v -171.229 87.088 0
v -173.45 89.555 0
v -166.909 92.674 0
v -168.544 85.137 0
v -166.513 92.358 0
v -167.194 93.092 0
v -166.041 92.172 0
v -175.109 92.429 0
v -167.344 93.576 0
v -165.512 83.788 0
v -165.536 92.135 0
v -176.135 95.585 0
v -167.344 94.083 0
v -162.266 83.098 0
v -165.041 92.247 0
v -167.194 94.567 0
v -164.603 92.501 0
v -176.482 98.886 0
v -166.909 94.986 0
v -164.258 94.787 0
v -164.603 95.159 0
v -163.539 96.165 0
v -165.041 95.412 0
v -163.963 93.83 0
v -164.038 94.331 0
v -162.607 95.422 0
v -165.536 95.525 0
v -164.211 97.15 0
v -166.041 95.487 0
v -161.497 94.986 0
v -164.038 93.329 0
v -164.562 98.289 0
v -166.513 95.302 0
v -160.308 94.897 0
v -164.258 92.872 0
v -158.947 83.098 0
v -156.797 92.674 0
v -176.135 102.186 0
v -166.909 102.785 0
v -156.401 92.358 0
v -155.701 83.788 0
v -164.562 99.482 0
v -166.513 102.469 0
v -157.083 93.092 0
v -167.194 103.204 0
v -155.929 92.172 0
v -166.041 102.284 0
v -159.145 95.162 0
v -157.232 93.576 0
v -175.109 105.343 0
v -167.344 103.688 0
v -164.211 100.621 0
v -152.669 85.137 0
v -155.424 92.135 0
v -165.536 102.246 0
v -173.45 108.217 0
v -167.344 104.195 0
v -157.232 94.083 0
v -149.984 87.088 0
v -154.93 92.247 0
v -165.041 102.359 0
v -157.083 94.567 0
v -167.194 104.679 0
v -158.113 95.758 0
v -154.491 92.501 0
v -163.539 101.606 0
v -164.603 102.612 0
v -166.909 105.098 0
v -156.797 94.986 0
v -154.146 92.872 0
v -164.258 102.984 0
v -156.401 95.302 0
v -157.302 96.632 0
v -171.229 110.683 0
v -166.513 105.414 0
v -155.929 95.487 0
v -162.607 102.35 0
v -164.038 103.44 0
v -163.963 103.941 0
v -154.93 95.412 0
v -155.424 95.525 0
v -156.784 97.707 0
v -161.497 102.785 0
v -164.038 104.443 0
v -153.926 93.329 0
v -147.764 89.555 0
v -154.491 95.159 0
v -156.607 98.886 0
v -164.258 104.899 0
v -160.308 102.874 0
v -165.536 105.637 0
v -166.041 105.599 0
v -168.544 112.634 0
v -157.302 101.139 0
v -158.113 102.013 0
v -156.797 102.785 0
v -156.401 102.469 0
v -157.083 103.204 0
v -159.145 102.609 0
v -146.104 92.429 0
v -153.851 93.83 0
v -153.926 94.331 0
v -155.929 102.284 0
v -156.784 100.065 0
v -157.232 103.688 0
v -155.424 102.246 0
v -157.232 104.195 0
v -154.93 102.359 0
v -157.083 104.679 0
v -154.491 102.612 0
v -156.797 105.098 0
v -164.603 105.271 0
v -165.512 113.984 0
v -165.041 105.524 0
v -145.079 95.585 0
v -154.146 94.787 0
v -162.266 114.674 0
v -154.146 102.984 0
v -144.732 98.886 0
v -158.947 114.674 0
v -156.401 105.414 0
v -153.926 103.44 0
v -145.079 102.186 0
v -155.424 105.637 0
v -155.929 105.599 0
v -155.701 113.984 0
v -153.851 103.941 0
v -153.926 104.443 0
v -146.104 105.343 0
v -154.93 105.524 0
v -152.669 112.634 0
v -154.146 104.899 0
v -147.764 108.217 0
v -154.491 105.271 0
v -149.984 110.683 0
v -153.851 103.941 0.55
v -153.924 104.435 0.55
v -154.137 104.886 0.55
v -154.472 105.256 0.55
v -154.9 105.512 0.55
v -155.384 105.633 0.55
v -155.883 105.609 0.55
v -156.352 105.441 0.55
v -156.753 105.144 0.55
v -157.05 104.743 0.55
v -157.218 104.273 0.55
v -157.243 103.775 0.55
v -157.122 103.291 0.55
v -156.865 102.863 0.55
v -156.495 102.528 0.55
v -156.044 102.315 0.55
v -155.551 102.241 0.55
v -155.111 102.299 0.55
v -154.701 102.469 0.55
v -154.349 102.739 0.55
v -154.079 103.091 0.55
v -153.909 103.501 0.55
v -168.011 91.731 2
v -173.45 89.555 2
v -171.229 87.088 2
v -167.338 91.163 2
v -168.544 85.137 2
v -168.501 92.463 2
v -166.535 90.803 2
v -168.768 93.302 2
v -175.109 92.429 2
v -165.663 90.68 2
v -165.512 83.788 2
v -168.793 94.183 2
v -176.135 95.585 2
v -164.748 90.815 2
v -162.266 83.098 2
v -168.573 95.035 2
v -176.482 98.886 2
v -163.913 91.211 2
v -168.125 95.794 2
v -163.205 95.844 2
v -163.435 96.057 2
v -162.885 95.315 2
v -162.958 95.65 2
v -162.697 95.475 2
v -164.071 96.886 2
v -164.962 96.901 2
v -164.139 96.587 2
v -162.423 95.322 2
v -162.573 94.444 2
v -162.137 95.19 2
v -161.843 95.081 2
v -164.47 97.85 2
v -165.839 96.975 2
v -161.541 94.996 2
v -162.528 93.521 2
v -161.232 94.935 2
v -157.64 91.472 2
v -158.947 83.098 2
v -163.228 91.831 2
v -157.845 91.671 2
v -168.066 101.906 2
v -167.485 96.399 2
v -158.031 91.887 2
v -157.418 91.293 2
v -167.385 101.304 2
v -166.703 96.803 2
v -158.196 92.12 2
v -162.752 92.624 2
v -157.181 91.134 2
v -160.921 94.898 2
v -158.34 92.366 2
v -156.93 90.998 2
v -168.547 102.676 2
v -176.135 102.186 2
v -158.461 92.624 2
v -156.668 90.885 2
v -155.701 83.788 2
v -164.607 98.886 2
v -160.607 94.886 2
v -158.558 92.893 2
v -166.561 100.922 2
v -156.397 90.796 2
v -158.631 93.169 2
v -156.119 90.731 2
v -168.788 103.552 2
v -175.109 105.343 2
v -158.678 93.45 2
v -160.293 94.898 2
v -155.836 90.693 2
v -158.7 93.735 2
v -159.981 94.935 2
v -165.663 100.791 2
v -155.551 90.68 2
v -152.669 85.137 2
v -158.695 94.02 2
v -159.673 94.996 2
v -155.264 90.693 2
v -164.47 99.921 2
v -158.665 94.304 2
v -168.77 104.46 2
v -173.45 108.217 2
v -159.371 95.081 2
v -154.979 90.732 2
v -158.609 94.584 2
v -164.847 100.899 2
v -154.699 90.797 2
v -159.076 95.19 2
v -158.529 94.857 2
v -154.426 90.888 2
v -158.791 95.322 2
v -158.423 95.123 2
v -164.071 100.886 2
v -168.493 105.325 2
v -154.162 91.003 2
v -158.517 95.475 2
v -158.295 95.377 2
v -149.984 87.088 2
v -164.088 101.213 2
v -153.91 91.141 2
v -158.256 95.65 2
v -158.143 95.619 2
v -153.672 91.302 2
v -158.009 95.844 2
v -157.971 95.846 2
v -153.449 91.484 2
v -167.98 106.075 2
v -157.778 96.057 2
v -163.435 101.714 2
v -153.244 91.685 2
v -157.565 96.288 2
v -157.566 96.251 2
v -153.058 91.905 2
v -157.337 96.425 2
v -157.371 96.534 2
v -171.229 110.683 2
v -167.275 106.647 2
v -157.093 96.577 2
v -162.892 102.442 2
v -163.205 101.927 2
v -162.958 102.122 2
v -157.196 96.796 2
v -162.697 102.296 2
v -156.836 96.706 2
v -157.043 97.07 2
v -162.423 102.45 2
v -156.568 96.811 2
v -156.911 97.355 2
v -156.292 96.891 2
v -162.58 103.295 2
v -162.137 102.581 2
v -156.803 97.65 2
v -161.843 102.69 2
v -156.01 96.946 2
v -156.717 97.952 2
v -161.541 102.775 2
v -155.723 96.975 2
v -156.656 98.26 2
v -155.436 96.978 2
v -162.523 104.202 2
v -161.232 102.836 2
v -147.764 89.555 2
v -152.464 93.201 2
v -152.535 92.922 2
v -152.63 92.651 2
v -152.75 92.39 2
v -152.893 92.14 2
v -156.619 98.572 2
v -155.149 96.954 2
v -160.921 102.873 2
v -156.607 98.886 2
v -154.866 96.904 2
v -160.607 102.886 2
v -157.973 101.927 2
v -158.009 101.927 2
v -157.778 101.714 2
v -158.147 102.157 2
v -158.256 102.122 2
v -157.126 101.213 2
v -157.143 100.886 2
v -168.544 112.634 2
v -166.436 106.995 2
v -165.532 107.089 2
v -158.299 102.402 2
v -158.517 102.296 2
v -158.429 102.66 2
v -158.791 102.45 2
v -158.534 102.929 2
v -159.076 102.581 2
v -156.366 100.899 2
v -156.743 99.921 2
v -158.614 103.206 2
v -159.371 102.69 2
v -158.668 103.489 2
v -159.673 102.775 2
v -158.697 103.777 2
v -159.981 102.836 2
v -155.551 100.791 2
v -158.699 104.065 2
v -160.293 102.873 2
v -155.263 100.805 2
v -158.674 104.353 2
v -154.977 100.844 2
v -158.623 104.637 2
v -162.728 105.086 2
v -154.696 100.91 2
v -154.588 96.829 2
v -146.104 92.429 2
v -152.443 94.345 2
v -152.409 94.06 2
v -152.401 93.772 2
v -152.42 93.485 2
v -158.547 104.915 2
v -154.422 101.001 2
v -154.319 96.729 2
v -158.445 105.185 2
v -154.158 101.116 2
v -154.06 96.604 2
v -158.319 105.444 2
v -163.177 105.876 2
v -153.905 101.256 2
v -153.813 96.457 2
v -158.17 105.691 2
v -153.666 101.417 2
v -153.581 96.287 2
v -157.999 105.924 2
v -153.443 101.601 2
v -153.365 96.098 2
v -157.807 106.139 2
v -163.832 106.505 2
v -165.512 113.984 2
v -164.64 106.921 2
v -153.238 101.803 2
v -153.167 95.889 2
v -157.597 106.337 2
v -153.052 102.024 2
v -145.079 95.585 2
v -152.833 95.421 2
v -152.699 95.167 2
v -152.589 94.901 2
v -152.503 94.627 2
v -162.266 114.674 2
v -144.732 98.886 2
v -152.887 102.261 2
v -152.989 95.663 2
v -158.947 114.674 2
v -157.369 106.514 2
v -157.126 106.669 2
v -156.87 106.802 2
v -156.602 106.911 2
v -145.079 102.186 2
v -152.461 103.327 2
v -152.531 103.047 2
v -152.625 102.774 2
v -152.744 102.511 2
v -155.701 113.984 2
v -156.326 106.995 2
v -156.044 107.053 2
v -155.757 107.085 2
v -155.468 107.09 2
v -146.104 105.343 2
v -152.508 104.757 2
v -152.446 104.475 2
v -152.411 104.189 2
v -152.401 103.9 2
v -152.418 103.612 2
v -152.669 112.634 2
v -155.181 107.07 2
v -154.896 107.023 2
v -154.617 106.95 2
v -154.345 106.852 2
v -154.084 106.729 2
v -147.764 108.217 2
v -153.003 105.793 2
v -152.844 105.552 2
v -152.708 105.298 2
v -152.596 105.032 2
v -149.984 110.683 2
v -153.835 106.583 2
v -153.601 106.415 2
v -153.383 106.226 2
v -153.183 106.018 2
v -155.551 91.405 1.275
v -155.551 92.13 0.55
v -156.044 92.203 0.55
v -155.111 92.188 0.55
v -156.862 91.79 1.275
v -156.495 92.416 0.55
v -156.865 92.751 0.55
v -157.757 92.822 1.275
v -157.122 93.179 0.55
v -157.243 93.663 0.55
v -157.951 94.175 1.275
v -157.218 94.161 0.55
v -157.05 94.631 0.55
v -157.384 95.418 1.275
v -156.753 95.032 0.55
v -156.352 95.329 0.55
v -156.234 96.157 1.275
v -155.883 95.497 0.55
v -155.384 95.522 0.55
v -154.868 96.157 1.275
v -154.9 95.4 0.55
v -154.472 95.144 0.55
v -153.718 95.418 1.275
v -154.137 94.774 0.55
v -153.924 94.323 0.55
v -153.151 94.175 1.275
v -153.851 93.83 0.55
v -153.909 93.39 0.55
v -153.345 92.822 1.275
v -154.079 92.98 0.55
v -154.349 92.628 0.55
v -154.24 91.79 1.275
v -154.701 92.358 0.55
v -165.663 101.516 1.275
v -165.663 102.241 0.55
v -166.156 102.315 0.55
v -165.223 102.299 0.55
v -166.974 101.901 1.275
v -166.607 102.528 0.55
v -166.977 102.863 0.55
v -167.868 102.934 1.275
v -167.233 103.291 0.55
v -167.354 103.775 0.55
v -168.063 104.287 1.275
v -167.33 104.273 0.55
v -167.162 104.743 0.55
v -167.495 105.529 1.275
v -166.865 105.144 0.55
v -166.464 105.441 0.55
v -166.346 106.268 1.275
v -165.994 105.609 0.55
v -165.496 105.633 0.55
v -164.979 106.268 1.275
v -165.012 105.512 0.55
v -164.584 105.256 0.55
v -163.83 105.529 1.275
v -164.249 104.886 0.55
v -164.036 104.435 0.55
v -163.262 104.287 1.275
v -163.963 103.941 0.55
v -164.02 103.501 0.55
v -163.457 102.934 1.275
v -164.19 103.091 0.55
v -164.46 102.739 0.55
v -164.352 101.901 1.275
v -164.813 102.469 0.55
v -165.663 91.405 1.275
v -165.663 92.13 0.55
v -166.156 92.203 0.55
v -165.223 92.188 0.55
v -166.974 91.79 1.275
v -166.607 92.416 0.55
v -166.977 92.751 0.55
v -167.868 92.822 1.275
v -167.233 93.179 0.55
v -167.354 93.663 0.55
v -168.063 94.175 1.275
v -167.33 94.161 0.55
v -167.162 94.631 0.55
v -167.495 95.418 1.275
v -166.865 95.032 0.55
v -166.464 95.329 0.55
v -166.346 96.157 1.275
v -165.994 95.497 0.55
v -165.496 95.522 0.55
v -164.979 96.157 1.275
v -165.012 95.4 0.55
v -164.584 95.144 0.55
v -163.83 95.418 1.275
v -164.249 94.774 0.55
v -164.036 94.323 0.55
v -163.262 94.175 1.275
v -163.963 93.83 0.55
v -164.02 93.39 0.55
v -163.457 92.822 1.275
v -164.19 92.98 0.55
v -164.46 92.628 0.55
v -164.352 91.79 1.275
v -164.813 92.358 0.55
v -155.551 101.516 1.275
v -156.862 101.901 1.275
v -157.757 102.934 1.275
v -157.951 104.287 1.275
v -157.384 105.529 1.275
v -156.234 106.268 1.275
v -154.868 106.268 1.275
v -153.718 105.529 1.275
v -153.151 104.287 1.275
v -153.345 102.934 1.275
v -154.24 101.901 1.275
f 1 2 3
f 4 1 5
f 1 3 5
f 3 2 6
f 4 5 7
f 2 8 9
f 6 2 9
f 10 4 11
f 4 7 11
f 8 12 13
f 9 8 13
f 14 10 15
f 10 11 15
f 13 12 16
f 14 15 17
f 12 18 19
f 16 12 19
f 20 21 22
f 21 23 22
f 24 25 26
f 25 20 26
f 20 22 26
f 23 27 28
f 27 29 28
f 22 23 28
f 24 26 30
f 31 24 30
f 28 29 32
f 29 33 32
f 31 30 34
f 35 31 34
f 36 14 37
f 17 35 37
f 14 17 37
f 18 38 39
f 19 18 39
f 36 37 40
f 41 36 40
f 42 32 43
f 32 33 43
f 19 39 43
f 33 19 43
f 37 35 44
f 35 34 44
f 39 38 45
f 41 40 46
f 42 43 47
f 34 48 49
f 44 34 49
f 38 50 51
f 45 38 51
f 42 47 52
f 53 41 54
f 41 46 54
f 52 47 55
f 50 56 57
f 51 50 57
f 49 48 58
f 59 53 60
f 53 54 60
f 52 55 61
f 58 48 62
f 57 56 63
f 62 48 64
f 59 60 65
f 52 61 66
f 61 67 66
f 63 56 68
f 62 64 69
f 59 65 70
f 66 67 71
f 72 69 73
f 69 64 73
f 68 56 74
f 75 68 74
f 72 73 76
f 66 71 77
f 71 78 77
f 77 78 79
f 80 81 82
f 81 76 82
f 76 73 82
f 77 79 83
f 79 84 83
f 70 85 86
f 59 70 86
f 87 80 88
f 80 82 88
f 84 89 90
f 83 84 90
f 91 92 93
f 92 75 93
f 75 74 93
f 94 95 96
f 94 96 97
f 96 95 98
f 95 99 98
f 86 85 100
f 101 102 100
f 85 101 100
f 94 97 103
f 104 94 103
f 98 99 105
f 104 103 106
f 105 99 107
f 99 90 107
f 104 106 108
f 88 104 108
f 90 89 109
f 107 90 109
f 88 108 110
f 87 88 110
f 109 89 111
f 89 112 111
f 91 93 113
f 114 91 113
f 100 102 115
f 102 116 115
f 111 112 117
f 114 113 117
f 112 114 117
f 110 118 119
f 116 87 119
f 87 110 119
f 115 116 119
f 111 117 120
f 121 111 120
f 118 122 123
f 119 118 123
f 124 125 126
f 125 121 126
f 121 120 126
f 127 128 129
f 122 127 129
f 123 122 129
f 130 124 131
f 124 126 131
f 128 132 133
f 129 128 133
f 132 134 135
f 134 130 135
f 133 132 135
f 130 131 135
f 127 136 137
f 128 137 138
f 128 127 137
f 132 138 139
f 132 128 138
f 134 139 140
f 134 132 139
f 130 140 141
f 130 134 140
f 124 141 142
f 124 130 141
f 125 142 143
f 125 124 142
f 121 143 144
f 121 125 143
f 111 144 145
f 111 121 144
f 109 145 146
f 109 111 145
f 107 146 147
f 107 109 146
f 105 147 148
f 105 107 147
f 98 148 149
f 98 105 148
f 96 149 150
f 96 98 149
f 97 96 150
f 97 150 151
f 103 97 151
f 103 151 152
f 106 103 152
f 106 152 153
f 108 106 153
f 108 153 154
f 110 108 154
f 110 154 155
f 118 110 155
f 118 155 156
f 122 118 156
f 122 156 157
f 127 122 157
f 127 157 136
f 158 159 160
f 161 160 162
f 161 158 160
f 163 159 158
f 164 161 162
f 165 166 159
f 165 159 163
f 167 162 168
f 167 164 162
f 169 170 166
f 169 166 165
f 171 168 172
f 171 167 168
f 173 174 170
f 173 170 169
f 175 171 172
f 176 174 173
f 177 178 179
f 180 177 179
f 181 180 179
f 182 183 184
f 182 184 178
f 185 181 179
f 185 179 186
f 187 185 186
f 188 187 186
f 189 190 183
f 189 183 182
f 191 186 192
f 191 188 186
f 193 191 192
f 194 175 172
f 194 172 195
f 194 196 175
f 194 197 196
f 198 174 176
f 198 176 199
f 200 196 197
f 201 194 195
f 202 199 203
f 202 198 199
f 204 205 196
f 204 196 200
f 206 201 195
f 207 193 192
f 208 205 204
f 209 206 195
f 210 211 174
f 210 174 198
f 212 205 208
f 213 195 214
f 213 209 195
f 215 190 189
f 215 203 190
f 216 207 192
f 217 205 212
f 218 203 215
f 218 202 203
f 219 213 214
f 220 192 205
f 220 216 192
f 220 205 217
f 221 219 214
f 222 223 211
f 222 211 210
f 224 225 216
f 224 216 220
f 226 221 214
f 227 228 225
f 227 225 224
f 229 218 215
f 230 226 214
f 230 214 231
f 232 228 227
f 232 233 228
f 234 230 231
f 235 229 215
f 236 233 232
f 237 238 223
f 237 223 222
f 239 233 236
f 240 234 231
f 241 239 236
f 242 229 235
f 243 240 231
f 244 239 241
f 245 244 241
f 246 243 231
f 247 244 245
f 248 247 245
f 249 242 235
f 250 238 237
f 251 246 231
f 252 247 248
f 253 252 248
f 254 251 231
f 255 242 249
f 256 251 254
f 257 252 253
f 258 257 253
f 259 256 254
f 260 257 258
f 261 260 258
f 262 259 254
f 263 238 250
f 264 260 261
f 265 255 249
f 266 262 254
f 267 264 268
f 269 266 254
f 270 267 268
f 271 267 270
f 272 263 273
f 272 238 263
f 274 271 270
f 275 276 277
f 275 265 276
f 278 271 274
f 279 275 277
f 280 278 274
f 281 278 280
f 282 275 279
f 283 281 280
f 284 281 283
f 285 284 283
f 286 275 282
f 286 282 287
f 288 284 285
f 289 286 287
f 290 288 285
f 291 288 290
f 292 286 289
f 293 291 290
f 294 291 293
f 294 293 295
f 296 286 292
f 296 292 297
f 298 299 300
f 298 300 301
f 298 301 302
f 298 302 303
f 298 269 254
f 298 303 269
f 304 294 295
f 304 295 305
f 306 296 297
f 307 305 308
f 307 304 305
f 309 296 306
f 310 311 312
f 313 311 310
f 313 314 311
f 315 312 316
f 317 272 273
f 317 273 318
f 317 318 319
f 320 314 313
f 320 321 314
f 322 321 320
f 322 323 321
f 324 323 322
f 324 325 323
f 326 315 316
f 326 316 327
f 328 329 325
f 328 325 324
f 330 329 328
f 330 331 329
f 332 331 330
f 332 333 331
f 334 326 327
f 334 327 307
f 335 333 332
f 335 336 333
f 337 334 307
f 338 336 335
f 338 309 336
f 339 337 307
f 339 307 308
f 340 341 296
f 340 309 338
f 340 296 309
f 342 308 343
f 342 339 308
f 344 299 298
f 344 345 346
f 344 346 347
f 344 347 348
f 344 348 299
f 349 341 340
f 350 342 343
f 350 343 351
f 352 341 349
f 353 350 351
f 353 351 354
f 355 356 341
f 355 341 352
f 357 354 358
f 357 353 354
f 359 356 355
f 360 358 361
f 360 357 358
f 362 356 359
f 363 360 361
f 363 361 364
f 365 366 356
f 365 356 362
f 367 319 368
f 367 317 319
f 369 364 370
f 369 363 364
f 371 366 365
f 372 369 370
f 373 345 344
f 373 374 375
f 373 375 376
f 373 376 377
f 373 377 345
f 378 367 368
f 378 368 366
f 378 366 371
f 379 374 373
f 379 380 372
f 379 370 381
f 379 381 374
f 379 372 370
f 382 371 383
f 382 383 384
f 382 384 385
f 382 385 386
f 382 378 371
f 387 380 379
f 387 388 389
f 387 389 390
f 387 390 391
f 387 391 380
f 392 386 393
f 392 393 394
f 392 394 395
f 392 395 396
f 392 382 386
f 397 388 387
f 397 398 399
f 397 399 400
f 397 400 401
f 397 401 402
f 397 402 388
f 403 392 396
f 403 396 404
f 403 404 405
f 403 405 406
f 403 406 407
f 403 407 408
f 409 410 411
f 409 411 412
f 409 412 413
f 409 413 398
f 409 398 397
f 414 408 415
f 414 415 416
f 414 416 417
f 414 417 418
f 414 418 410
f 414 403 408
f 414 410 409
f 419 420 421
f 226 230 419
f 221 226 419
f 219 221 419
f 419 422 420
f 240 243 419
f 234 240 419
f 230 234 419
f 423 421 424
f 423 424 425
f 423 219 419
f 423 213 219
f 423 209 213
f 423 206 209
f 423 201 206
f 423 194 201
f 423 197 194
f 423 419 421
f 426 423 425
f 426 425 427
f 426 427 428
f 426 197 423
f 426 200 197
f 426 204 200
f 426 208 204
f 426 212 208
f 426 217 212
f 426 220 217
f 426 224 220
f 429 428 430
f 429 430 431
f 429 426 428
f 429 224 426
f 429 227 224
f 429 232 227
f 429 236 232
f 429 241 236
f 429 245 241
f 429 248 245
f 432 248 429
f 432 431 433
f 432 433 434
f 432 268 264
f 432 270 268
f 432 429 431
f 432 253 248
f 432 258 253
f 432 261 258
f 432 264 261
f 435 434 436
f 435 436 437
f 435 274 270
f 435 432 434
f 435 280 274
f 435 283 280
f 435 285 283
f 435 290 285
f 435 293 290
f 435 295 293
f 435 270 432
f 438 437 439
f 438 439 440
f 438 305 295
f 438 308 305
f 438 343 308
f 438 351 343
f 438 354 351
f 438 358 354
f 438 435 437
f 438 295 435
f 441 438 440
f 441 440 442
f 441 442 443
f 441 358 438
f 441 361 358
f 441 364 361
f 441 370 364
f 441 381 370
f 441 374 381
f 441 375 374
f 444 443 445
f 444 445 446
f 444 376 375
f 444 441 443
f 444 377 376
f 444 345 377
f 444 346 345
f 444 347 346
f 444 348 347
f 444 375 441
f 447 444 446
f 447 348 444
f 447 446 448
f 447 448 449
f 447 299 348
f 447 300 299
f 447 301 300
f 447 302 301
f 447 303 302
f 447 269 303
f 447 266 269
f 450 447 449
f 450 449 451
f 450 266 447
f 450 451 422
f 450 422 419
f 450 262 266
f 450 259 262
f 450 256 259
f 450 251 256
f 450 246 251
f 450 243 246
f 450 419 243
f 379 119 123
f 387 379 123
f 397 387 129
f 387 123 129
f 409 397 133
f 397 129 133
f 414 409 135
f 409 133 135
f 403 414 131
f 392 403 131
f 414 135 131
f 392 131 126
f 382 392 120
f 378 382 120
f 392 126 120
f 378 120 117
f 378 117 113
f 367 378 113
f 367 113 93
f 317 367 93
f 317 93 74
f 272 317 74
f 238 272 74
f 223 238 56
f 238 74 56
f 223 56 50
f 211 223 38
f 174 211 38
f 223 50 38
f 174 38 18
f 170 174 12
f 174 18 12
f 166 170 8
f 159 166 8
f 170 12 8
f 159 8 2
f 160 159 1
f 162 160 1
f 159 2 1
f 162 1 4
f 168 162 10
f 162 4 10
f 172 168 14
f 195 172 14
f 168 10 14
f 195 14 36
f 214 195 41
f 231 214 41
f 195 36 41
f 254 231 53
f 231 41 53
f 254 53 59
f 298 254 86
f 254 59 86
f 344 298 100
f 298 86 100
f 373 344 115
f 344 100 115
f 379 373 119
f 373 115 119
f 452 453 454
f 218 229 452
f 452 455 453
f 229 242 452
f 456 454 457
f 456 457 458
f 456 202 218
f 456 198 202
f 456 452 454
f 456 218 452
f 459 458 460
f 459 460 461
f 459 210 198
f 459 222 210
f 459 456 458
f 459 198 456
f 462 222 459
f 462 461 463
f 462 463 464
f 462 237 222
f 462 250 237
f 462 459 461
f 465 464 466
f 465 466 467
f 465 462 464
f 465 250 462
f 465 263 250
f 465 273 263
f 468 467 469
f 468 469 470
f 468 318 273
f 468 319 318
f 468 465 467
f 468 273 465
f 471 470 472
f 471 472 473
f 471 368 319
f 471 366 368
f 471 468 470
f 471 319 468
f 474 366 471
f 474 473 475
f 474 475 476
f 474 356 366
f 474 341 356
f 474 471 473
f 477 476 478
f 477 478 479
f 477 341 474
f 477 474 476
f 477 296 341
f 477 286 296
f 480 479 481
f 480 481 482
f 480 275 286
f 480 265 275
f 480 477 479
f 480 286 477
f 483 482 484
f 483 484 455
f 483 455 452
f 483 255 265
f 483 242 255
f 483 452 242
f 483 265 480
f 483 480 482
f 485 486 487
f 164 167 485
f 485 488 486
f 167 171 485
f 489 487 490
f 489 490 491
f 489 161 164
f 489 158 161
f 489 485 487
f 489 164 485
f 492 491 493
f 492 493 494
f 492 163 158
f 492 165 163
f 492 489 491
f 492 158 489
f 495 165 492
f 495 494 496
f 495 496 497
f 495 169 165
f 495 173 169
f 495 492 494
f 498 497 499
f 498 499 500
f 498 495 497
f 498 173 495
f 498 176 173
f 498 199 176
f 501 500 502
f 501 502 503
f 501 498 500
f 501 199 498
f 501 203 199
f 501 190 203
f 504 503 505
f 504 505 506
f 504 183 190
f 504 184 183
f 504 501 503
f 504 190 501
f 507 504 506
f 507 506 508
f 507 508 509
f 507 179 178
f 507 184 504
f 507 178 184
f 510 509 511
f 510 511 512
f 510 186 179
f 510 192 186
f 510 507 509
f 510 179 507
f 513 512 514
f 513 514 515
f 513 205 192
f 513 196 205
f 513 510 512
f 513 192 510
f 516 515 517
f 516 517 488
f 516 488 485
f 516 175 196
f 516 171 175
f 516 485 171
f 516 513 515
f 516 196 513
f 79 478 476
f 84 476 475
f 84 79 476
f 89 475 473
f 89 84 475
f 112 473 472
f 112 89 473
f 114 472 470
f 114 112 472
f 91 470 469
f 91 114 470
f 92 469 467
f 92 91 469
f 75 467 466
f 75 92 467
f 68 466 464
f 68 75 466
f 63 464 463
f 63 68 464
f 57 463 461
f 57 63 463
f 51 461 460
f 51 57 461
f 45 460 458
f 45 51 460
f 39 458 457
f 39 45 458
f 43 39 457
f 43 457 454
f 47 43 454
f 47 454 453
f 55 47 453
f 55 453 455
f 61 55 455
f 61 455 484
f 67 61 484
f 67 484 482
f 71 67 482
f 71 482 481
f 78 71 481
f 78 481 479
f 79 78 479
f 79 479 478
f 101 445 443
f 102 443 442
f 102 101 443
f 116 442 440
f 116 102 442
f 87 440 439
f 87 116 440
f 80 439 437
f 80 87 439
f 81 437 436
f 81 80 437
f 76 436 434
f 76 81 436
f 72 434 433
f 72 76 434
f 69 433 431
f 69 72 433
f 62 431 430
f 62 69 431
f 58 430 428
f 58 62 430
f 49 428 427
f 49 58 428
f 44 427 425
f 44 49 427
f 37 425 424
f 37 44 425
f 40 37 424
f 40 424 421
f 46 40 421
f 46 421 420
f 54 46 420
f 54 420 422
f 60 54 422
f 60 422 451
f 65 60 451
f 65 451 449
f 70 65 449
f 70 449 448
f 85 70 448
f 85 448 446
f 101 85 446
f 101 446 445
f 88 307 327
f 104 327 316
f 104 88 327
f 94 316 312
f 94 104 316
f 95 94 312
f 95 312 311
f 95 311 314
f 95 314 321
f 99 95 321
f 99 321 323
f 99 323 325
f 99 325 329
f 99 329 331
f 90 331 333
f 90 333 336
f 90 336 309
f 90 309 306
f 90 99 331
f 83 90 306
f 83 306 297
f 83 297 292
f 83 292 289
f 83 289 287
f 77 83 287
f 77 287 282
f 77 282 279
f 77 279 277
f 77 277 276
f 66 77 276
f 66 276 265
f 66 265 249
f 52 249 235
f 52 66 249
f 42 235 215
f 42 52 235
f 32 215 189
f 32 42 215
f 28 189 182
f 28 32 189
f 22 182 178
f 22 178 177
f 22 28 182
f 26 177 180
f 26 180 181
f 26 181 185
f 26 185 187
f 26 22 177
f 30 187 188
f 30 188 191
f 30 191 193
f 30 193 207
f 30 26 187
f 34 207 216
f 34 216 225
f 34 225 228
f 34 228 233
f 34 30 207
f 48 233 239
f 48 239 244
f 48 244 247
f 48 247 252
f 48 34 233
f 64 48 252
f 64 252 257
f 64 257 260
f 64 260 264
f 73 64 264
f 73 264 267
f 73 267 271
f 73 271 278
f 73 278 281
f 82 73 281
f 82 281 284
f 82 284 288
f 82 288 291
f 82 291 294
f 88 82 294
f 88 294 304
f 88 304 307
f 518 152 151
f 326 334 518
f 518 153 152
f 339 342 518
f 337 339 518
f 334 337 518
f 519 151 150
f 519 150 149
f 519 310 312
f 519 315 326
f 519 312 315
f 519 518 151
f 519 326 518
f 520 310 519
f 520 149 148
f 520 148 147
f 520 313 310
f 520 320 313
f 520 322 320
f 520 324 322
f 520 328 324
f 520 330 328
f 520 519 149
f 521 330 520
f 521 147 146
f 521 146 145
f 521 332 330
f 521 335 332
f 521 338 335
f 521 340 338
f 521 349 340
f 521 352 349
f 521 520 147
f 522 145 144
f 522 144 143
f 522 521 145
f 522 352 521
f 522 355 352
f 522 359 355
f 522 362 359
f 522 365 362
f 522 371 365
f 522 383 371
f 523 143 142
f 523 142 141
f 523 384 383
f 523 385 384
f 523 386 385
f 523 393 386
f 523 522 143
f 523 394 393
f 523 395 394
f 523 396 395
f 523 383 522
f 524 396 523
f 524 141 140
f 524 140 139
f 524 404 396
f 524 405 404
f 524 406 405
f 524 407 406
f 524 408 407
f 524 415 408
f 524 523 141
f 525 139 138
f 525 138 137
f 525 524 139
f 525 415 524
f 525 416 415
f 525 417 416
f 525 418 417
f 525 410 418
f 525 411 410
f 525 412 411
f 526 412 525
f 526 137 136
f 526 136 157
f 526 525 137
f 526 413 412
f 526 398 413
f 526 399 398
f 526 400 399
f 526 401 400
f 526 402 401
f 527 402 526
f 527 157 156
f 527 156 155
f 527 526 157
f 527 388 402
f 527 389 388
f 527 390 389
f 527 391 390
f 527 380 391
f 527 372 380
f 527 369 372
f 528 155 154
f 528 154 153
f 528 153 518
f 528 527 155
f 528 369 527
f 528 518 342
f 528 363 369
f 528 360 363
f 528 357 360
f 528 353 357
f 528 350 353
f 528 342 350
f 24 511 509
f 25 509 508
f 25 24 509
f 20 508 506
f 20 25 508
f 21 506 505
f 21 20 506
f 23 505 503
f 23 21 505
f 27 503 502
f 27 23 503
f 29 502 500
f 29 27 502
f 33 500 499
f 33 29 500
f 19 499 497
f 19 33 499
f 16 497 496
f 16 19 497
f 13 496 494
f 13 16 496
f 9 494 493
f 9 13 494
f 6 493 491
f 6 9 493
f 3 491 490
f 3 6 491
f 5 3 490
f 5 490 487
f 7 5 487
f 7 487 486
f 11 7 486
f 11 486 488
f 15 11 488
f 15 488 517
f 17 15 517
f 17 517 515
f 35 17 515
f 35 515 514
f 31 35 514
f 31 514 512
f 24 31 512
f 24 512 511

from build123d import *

# Parameters (mm, degrees)
SKETCH2_R                                      = 15.875
SKETCH2_R_2                                    = 1.7
SKETCH2_R_3                                    = 4
BOSS_EXTRUDE1_DEPTH                            = 2
CSK_FOR_M3_FLAT_HEAD_MACHINE_SCREW2_AT_2_COUNT = 2
CSK_FOR_M3_FLAT_HEAD_MACHINE_SCREW2_AT_2_PITCH = 10.111626971
CSK_FOR_M3_FLAT_HEAD_MACHINE_SCREW2_AT_3_COUNT = 2
CSK_FOR_M3_FLAT_HEAD_MACHINE_SCREW2_AT_3_PITCH = 14.3
CSK_FOR_M3_FLAT_HEAD_MACHINE_SCREW2_AT_4_COUNT = 2
CSK_FOR_M3_FLAT_HEAD_MACHINE_SCREW2_AT_4_PITCH = 10.111626971


with BuildPart() as part:
    # Sketch2 → Boss-Extrude1 (new body)
    with BuildSketch(Plane.XY):
        with Locations((-160.606756626, 98.885631483)):
            Circle(SKETCH2_R)
        with Locations((-165.662570112, 103.941444968)):
            Circle(SKETCH2_R_2, mode=Mode.SUBTRACT)
        with Locations((-155.550943141, 103.941444968)):
            Circle(SKETCH2_R_2, mode=Mode.SUBTRACT)
        with Locations((-155.550943141, 93.829817997)):
            Circle(SKETCH2_R_2, mode=Mode.SUBTRACT)
        with Locations((-165.662570112, 93.829817997)):
            Circle(SKETCH2_R_2, mode=Mode.SUBTRACT)
        with Locations((-160.606756626, 98.885631483)):
            Circle(SKETCH2_R_3, mode=Mode.SUBTRACT)
    extrude(amount=BOSS_EXTRUDE1_DEPTH)

    # Sketch4 → CSK for M3 Flat Head Machine Screw2 (revolve, cut)
    with BuildSketch(Plane(origin=(-165.662570112, 103.941444968, 2), x_dir=(0, -1, 0), z_dir=(1, 0, 0))):
        Polygon((0, 0), (0, 2), (1.7, 2), (1.7, 1.45), (3.15, 0), align=None)
    csk_for_m3_flat_head_machine_screw2 = revolve(axis=Axis((-165.662570112, 103.941444968, 8.35), (0, 0, -1)), mode=Mode.SUBTRACT)

    # CSK for M3 Flat Head Machine Screw2 at 2: CSK for M3 Flat Head Machine Screw2 ×2
    with Locations(*[(i * CSK_FOR_M3_FLAT_HEAD_MACHINE_SCREW2_AT_2_PITCH, 0, 0) for i in range(1, CSK_FOR_M3_FLAT_HEAD_MACHINE_SCREW2_AT_2_COUNT)]):
        add(csk_for_m3_flat_head_machine_screw2, mode=Mode.SUBTRACT)

    # CSK for M3 Flat Head Machine Screw2 at 3: CSK for M3 Flat Head Machine Screw2 ×2
    with Locations(*[Vector(0.707106781, -0.707106781, 0) * (i * CSK_FOR_M3_FLAT_HEAD_MACHINE_SCREW2_AT_3_PITCH) for i in range(1, CSK_FOR_M3_FLAT_HEAD_MACHINE_SCREW2_AT_3_COUNT)]):
        add(csk_for_m3_flat_head_machine_screw2, mode=Mode.SUBTRACT)

    # CSK for M3 Flat Head Machine Screw2 at 4: CSK for M3 Flat Head Machine Screw2 ×2
    with Locations(*[(0, -i * CSK_FOR_M3_FLAT_HEAD_MACHINE_SCREW2_AT_4_PITCH, 0) for i in range(1, CSK_FOR_M3_FLAT_HEAD_MACHINE_SCREW2_AT_4_COUNT)]):
        add(csk_for_m3_flat_head_machine_screw2, mode=Mode.SUBTRACT)


solid = part.part
